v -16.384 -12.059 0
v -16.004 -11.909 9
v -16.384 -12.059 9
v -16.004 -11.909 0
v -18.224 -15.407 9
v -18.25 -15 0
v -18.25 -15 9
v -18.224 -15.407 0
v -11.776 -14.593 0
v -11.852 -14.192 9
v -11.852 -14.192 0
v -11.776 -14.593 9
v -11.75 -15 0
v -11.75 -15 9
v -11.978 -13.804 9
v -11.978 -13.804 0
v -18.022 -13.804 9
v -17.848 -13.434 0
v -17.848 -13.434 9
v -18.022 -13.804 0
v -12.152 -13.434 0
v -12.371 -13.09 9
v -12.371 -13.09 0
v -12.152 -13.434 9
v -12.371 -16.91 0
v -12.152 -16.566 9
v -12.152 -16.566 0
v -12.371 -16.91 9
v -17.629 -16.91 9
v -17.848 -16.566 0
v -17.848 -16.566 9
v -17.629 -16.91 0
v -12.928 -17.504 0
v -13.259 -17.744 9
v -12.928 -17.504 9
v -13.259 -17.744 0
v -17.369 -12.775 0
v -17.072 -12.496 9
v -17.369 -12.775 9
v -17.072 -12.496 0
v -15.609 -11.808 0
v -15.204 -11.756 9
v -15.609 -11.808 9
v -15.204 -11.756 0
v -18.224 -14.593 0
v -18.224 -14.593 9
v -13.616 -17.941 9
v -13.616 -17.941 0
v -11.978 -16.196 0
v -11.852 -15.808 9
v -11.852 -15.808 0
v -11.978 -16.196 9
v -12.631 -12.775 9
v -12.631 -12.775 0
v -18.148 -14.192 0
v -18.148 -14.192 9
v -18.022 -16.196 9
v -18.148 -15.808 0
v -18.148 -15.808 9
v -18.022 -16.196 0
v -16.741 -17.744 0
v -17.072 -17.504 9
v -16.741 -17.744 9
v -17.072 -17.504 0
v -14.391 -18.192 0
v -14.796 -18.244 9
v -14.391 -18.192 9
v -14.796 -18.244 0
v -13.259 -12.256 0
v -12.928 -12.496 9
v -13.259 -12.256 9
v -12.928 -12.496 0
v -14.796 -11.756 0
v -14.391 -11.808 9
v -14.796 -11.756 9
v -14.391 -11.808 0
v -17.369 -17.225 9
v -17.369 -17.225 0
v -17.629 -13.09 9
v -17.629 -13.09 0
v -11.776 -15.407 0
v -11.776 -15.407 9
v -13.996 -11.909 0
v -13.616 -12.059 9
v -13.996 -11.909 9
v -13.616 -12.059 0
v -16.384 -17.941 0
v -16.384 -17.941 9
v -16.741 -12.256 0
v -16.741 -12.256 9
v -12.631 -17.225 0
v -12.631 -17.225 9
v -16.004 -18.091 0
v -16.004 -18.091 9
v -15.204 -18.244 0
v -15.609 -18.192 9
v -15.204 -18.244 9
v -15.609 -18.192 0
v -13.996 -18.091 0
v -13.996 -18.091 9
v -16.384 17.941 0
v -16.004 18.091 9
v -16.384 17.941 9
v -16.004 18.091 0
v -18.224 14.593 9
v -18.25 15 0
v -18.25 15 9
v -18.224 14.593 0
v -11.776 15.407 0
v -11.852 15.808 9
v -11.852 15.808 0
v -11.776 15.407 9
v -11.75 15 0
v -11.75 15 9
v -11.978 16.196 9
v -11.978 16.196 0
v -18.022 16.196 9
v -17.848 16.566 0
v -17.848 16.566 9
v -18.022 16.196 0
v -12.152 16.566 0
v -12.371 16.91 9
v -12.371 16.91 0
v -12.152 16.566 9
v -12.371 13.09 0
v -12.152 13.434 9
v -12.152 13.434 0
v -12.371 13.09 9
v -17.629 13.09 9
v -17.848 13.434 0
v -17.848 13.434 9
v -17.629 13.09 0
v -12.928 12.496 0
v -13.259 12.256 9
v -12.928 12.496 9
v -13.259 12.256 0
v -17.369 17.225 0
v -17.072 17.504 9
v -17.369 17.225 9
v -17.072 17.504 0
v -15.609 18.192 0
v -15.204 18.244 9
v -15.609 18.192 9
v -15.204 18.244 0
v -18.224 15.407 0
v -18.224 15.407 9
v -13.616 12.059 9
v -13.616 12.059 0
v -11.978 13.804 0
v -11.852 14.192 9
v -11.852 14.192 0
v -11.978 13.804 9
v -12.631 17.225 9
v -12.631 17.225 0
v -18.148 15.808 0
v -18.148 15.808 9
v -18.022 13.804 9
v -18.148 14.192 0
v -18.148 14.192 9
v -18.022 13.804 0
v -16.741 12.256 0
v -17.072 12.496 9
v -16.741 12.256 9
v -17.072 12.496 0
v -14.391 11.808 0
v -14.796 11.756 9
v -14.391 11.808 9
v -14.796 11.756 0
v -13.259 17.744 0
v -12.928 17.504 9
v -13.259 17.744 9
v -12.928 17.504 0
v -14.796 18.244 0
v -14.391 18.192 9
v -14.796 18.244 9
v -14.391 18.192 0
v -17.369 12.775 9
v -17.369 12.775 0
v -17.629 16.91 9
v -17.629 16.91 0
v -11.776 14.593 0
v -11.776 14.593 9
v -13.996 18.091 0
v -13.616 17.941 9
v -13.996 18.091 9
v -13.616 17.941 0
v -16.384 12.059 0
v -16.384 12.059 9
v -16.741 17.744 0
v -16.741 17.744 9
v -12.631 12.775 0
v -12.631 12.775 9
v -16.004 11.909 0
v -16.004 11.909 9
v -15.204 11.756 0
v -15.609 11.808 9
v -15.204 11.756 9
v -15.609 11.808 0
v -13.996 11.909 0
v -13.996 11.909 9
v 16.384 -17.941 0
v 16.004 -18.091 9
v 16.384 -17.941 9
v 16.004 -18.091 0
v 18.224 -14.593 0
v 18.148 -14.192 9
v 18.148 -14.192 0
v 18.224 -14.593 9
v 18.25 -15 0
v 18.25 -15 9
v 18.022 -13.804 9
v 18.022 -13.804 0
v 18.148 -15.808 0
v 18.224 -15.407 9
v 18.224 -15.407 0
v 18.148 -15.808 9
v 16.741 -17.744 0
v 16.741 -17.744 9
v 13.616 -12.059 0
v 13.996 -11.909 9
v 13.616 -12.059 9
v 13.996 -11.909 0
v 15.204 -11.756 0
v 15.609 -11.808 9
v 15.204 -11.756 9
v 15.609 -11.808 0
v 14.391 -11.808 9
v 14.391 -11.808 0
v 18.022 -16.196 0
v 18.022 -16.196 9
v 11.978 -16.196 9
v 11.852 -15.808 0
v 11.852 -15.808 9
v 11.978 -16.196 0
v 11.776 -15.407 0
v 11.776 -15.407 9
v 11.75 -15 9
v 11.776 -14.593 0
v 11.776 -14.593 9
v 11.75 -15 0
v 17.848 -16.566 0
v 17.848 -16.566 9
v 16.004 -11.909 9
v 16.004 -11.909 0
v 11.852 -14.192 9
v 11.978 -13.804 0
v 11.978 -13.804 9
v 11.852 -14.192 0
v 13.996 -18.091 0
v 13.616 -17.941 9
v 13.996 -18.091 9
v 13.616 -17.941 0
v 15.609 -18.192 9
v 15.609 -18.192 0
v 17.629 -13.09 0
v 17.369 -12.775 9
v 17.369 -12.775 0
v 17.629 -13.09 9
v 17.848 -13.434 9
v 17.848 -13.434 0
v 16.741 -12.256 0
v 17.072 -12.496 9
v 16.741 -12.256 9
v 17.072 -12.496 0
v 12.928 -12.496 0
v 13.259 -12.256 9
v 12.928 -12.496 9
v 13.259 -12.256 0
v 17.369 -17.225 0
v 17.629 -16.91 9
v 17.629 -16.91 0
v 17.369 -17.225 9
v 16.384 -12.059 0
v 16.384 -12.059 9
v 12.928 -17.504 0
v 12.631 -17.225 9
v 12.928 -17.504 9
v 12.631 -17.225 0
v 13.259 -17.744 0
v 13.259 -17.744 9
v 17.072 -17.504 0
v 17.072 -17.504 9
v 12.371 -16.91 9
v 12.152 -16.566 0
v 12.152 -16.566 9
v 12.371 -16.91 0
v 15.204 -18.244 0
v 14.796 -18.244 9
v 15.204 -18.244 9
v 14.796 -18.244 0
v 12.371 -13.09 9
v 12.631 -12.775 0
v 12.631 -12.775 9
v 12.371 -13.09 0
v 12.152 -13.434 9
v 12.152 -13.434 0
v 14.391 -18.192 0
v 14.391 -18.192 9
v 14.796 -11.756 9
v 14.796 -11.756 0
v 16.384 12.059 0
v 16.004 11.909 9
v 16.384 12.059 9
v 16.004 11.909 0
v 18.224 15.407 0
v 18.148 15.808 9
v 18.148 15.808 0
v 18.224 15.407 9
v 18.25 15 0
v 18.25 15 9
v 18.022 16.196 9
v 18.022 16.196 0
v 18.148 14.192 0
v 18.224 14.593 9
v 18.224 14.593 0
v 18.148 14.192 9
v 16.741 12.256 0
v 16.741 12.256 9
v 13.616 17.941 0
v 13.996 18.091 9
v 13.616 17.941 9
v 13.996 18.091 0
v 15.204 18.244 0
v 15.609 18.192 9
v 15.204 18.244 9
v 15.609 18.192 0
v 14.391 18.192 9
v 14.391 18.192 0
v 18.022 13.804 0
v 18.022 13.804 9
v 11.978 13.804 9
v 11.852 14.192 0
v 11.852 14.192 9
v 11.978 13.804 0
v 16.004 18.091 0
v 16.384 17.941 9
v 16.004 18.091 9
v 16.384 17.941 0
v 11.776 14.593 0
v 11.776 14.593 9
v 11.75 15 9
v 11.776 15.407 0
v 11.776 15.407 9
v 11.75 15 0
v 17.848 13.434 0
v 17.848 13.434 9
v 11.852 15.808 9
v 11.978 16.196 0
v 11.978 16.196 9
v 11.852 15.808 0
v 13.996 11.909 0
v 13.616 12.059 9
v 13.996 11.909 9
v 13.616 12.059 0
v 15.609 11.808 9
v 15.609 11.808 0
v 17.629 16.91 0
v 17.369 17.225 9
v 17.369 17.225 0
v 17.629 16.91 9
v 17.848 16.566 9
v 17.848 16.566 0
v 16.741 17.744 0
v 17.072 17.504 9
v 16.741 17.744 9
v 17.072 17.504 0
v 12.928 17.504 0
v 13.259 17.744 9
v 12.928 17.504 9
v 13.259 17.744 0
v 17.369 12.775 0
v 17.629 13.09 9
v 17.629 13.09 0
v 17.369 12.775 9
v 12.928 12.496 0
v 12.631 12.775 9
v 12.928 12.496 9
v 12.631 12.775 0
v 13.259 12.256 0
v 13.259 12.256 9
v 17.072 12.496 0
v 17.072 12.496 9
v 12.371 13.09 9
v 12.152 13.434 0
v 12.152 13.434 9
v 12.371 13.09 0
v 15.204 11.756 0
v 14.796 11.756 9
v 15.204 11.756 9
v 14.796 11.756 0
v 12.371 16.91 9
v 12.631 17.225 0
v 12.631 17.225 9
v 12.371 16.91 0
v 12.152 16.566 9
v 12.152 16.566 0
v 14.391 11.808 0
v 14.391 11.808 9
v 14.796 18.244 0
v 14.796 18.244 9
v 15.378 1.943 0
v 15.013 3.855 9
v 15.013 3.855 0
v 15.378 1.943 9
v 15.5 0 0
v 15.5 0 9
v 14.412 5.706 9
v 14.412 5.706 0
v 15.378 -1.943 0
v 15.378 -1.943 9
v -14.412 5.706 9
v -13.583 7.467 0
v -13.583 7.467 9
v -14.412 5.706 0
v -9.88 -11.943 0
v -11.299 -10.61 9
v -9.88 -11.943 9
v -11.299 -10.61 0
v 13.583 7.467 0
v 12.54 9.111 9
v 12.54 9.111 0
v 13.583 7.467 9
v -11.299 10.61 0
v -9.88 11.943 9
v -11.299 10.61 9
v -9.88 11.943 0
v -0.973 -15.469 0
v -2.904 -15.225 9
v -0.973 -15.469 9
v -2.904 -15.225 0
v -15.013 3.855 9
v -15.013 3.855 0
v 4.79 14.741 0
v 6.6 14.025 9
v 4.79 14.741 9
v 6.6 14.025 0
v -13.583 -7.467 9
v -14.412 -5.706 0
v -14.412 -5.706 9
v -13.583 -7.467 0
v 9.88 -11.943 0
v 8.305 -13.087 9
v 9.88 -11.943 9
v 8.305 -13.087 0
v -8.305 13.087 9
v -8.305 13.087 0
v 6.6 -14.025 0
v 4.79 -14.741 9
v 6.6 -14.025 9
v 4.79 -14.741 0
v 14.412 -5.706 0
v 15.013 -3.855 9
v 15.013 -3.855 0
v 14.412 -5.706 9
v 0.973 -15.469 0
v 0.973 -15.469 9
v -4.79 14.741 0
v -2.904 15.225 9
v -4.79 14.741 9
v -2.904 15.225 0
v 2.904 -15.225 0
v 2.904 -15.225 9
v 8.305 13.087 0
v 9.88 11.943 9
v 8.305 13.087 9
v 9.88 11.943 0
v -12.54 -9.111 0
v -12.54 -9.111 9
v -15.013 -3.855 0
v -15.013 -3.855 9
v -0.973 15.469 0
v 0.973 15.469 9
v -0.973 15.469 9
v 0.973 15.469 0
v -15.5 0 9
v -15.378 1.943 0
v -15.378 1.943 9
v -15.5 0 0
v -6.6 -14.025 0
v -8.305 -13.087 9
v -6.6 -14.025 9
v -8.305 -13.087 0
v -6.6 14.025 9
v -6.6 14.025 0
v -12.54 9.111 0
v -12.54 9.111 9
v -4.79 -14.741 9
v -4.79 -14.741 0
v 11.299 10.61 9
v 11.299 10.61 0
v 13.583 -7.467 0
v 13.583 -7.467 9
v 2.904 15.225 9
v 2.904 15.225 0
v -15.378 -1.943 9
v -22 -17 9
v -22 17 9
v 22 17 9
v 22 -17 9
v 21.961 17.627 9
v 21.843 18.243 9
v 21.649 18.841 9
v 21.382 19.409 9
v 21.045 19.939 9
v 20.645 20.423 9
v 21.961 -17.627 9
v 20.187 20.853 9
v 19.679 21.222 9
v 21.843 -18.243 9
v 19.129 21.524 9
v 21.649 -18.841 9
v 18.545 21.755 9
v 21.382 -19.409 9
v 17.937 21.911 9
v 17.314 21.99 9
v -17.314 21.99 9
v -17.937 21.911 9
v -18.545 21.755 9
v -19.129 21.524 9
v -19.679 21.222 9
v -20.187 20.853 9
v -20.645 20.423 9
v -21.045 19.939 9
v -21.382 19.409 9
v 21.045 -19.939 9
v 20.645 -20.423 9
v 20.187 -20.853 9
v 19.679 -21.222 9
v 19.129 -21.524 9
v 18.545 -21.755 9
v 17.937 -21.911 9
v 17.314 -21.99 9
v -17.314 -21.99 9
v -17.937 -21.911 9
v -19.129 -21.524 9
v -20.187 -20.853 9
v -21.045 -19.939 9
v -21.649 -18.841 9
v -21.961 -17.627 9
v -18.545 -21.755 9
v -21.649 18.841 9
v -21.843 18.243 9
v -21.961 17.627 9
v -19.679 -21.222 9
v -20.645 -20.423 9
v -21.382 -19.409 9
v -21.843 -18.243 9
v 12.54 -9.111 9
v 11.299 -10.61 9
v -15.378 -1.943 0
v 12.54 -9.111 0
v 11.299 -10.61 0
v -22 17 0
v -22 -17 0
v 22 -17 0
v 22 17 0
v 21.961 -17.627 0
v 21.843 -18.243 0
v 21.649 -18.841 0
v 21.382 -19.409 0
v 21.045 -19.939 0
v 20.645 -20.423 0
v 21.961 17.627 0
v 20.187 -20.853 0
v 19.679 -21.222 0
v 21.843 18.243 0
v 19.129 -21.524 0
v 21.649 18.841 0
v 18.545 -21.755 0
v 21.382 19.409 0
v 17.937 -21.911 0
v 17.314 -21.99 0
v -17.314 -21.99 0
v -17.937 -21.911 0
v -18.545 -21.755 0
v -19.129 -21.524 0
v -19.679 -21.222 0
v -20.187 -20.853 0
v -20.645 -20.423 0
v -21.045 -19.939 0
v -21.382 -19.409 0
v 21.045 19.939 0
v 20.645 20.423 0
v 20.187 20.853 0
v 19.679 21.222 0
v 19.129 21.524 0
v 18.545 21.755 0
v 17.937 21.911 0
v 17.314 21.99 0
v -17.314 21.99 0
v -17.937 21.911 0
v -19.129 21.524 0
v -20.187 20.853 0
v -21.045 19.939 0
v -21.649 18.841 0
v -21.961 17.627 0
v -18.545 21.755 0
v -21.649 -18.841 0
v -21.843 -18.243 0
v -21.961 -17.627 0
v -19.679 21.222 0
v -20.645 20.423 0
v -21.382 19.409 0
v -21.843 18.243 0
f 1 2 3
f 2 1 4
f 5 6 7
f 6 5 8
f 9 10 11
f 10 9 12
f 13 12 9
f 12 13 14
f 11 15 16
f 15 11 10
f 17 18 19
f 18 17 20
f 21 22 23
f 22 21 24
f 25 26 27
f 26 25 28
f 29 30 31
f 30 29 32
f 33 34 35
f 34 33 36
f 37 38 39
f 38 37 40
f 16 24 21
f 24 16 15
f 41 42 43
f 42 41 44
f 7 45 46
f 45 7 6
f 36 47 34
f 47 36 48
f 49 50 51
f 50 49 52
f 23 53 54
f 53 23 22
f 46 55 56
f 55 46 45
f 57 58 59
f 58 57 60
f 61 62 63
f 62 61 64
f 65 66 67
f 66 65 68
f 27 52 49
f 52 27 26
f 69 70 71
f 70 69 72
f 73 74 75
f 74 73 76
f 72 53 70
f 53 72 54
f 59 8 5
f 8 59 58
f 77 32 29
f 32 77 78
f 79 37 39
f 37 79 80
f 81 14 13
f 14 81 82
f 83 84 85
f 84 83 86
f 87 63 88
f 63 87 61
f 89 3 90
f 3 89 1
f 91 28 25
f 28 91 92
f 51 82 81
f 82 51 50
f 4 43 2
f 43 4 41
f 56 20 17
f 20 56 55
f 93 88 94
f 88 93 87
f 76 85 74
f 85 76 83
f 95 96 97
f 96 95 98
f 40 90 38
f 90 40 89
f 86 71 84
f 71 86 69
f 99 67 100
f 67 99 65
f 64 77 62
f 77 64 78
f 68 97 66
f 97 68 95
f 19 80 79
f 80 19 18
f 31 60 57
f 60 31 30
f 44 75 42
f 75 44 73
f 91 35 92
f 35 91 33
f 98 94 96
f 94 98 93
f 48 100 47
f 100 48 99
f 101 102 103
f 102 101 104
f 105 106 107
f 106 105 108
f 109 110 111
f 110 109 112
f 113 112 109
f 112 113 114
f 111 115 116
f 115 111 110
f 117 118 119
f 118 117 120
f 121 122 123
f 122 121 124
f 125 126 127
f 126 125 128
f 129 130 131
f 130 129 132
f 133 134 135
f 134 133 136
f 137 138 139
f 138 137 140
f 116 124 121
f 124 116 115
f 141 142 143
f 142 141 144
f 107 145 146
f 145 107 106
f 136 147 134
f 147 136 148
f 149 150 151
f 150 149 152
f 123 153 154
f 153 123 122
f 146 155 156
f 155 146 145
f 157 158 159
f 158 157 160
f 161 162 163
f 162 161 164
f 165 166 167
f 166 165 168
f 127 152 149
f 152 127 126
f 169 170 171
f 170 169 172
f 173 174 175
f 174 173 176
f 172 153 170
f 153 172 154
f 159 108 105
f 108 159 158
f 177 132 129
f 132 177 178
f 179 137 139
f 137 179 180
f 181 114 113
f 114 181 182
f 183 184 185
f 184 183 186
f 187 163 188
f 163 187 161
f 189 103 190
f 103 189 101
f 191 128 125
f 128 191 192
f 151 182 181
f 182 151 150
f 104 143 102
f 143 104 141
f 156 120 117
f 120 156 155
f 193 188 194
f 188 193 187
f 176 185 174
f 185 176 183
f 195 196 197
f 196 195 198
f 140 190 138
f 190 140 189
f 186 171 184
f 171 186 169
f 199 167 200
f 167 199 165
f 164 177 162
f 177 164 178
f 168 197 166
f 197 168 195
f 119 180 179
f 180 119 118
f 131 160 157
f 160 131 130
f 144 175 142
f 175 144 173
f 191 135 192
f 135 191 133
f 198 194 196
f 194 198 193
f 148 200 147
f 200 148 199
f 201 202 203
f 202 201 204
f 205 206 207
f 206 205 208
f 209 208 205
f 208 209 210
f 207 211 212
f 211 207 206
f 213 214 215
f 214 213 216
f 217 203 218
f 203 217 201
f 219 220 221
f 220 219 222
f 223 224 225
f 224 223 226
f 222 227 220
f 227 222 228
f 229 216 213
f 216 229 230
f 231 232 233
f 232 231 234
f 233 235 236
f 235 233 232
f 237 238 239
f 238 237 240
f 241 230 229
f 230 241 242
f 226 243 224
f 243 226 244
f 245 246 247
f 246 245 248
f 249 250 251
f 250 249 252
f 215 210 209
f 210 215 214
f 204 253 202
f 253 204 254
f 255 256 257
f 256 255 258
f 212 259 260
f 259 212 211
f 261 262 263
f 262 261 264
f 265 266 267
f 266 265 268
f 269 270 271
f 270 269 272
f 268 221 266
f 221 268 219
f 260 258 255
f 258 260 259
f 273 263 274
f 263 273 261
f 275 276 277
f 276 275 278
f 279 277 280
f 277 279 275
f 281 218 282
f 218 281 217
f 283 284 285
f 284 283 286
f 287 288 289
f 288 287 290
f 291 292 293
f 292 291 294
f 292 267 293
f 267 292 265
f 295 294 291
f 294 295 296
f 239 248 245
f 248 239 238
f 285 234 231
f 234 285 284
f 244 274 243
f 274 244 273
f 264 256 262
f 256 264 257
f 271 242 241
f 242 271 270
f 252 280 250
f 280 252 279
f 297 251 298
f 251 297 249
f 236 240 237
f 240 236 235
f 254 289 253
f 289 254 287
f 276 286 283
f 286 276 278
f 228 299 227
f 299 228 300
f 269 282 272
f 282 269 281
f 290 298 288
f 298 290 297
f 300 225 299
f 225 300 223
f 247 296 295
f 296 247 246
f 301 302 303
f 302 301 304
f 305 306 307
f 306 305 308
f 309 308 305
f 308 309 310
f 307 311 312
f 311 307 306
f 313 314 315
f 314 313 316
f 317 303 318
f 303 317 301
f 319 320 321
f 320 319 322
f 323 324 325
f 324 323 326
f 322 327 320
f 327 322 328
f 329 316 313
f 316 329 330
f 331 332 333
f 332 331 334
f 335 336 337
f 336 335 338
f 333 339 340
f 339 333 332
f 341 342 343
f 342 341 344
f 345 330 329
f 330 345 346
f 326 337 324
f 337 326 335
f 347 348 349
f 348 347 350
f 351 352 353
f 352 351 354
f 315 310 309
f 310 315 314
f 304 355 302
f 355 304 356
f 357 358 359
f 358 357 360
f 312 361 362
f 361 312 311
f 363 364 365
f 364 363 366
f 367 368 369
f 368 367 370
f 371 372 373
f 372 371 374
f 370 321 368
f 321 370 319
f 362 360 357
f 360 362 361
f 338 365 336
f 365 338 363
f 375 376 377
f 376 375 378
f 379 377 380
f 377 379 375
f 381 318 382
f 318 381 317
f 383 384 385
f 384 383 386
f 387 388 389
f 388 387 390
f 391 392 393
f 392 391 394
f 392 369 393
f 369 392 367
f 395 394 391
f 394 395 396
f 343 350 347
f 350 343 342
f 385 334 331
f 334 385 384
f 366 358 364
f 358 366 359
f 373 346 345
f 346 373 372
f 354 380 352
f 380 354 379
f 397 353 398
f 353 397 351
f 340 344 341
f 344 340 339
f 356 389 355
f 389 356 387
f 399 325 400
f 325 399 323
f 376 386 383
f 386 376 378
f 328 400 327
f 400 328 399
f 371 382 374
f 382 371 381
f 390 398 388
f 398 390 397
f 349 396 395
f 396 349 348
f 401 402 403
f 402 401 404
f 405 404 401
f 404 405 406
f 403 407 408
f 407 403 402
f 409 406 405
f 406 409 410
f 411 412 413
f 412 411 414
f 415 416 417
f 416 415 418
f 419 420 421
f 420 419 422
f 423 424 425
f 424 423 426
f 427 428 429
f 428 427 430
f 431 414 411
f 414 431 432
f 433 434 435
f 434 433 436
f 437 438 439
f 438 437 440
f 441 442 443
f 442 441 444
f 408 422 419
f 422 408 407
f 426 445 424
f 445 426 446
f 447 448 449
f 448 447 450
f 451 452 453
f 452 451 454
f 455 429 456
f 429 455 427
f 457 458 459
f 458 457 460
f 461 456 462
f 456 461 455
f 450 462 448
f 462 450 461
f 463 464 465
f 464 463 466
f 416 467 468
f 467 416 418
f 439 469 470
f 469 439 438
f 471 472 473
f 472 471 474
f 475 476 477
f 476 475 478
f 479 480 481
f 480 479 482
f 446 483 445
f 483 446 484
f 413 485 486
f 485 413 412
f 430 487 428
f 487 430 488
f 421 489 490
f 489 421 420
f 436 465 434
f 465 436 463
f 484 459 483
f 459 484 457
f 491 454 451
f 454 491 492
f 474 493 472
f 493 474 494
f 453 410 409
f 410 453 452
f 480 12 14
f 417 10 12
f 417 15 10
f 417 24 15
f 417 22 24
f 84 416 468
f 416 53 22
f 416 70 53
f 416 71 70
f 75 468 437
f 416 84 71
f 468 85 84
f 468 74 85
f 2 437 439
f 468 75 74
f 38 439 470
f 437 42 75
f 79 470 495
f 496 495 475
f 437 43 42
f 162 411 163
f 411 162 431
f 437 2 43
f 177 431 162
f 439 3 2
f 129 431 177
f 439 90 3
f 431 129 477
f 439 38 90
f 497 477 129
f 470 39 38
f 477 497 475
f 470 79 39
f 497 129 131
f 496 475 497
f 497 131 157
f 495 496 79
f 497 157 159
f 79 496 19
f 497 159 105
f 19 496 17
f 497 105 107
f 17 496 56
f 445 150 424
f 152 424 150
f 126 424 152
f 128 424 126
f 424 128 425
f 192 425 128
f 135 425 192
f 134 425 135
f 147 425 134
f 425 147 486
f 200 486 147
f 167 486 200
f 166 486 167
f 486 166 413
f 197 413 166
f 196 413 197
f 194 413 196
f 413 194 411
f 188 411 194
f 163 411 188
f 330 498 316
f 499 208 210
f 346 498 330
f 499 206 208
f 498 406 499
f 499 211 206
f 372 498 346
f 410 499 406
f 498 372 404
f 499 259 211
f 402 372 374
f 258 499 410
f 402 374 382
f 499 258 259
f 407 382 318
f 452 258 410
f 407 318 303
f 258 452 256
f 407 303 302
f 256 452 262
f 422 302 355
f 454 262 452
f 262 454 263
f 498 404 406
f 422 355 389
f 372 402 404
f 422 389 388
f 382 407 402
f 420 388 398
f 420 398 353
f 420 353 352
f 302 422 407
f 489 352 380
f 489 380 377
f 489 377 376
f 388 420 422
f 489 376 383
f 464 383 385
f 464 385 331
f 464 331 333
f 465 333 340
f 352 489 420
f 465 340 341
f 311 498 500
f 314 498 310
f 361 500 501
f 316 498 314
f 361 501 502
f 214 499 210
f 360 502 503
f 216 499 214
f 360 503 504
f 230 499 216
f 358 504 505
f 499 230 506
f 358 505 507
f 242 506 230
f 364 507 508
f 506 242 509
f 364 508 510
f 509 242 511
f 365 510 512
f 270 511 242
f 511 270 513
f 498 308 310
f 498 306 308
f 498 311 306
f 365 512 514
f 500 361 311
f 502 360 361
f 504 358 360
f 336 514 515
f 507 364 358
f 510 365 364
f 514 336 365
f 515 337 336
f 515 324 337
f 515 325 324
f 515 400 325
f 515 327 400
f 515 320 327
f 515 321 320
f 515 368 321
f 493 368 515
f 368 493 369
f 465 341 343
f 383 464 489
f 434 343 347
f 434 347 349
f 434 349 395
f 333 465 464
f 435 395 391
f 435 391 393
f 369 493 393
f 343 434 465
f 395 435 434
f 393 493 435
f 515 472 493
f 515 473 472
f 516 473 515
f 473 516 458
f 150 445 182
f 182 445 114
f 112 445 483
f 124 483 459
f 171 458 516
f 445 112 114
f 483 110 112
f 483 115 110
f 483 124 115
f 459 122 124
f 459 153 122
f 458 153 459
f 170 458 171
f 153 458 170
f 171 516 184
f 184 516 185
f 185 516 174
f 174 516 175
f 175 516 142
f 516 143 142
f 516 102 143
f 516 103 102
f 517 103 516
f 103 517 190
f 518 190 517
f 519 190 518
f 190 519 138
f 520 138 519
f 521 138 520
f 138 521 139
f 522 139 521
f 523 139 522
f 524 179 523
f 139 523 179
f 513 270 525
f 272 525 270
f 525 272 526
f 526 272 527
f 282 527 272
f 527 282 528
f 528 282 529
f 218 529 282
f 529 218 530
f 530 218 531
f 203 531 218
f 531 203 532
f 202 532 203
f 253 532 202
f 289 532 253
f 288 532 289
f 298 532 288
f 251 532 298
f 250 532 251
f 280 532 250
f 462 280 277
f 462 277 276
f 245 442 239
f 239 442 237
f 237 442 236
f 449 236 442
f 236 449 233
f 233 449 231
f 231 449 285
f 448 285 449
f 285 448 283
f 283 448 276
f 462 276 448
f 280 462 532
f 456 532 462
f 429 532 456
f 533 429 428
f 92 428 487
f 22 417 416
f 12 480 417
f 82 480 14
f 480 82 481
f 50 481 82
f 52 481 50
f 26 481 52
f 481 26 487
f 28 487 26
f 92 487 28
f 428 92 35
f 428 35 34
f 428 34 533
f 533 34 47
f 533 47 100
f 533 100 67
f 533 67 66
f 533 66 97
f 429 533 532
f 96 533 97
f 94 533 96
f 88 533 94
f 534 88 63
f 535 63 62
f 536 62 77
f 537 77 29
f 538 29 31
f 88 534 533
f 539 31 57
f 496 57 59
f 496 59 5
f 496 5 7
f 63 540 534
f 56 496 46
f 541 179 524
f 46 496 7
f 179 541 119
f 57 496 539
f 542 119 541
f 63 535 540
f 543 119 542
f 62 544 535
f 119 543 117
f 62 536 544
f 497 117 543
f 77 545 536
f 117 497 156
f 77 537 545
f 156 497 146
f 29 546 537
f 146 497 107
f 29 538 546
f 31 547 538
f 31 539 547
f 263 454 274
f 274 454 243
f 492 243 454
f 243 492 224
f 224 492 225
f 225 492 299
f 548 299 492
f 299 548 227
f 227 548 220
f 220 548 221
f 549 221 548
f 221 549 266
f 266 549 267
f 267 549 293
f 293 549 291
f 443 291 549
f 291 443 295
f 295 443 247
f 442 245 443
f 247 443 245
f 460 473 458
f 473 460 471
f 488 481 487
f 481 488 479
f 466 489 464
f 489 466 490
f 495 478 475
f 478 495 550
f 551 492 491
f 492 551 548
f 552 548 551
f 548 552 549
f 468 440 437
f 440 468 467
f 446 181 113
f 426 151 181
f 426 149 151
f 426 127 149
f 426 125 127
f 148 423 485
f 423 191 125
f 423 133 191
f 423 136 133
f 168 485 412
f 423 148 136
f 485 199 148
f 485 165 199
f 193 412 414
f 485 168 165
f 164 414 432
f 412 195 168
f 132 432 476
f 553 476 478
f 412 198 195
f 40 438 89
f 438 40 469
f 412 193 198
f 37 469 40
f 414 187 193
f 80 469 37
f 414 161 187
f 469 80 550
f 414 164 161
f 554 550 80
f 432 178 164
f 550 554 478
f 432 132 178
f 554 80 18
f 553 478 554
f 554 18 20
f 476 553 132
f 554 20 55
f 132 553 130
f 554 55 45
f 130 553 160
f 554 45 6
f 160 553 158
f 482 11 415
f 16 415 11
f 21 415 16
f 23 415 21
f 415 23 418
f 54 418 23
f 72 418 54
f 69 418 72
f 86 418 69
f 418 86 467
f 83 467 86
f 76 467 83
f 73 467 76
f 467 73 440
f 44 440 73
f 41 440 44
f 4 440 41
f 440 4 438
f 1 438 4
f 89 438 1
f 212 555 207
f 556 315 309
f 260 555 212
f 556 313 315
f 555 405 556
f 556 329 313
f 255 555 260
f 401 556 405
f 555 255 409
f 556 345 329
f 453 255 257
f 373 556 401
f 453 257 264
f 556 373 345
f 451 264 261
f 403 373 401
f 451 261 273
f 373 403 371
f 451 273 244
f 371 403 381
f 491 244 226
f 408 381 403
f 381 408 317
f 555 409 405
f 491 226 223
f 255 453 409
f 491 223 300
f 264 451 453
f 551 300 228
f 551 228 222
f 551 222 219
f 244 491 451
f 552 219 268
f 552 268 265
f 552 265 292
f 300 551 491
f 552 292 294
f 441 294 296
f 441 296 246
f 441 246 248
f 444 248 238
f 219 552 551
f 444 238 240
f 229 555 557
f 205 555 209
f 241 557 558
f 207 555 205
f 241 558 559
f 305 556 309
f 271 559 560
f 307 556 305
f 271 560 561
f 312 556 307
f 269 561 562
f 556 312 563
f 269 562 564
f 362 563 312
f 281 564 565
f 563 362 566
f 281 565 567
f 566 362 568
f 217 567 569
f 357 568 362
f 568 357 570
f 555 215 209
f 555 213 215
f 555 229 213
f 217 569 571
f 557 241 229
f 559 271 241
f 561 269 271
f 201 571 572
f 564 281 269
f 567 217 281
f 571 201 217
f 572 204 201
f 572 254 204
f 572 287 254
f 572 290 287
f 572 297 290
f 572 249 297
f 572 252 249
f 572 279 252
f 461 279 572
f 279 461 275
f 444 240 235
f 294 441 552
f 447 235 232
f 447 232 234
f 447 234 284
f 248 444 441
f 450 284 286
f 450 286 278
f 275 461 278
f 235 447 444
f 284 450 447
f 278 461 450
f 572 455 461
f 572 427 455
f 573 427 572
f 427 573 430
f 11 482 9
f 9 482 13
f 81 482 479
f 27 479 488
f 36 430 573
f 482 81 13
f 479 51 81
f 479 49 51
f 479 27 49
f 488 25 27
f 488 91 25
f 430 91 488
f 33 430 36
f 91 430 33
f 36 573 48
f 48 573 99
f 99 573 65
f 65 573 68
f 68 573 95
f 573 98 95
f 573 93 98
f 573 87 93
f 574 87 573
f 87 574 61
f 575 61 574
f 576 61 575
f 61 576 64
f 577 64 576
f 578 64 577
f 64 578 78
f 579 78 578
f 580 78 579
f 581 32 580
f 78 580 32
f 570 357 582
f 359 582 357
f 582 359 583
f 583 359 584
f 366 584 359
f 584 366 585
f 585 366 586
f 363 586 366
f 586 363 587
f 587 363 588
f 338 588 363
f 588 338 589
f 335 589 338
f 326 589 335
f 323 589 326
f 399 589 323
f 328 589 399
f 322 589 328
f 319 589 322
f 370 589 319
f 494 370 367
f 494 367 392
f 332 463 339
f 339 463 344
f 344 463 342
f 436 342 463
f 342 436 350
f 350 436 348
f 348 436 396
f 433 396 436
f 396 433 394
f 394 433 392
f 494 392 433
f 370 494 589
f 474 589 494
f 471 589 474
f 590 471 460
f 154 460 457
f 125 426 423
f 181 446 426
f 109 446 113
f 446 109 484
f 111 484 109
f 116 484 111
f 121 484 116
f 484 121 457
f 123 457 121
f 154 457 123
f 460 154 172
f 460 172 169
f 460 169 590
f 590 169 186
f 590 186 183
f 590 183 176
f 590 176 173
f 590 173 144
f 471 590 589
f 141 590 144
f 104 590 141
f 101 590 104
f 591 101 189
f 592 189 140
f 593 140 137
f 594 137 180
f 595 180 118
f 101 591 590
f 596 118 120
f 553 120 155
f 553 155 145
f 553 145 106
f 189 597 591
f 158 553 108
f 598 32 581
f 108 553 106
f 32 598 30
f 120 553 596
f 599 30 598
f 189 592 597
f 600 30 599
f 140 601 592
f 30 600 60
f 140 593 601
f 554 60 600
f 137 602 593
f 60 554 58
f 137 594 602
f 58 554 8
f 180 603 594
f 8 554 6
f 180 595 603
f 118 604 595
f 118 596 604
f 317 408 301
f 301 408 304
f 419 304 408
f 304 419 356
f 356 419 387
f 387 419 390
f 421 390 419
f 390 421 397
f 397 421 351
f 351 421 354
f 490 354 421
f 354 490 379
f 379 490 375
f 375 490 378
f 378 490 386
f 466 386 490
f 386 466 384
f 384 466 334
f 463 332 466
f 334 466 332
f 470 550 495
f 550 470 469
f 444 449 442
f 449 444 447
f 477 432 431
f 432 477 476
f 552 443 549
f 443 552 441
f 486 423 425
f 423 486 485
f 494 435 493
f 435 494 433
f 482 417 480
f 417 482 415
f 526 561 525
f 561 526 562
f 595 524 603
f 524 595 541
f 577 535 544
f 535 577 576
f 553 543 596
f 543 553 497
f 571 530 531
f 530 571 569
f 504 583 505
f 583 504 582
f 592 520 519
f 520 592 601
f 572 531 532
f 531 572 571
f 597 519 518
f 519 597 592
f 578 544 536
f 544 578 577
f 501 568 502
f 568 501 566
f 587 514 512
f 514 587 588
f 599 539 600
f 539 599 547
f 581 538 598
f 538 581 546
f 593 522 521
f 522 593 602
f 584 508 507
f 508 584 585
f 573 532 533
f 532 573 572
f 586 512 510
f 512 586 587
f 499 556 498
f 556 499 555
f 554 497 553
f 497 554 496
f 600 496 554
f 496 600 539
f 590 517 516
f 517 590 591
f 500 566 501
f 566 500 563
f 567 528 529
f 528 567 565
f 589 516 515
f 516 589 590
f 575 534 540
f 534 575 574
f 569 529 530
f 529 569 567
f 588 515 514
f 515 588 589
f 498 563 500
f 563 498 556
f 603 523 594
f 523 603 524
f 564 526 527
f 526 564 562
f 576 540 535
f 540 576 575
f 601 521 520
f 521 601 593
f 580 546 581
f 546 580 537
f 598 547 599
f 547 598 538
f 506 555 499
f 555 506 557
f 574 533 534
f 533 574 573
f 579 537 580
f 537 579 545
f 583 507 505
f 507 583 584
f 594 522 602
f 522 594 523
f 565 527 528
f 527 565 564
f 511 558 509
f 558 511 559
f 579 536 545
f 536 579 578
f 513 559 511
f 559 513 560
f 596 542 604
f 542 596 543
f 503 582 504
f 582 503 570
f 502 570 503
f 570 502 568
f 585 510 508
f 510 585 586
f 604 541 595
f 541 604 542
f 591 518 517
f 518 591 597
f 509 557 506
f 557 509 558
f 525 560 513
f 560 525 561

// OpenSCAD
$fn = 50;

difference() {
	union() {
		hull() {
			translate(v = [-17.0, 17.0, 0]) {
				cylinder(h = 9, r = 5);
			}
			translate(v = [17.0, 17.0, 0]) {
				cylinder(h = 9, r = 5);
			}
			translate(v = [-17.0, -17.0, 0]) {
				cylinder(h = 9, r = 5);
			}
			translate(v = [17.0, -17.0, 0]) {
				cylinder(h = 9, r = 5);
			}
		}
	}
	union() {
		translate(v = [-15.0, -15.0, -100.0]) {
			cylinder(h = 200, r = 3.25);
		}
		translate(v = [-15.0, 15.0, -100.0]) {
			cylinder(h = 200, r = 3.25);
		}
		translate(v = [15.0, -15.0, -100.0]) {
			cylinder(h = 200, r = 3.25);
		}
		translate(v = [15.0, 15.0, -100.0]) {
			cylinder(h = 200, r = 3.25);
		}
		translate(v = [-15.0, -15.0, -100.0]) {
			cylinder(h = 200, r = 1.8);
		}
		translate(v = [-15.0, 15.0, -100.0]) {
			cylinder(h = 200, r = 1.8);
		}
		translate(v = [15.0, -15.0, -100.0]) {
			cylinder(h = 200, r = 1.8);
		}
		translate(v = [15.0, 15.0, -100.0]) {
			cylinder(h = 200, r = 1.8);
		}
		cylinder(h = 9, r = 15.5);
	}
}
